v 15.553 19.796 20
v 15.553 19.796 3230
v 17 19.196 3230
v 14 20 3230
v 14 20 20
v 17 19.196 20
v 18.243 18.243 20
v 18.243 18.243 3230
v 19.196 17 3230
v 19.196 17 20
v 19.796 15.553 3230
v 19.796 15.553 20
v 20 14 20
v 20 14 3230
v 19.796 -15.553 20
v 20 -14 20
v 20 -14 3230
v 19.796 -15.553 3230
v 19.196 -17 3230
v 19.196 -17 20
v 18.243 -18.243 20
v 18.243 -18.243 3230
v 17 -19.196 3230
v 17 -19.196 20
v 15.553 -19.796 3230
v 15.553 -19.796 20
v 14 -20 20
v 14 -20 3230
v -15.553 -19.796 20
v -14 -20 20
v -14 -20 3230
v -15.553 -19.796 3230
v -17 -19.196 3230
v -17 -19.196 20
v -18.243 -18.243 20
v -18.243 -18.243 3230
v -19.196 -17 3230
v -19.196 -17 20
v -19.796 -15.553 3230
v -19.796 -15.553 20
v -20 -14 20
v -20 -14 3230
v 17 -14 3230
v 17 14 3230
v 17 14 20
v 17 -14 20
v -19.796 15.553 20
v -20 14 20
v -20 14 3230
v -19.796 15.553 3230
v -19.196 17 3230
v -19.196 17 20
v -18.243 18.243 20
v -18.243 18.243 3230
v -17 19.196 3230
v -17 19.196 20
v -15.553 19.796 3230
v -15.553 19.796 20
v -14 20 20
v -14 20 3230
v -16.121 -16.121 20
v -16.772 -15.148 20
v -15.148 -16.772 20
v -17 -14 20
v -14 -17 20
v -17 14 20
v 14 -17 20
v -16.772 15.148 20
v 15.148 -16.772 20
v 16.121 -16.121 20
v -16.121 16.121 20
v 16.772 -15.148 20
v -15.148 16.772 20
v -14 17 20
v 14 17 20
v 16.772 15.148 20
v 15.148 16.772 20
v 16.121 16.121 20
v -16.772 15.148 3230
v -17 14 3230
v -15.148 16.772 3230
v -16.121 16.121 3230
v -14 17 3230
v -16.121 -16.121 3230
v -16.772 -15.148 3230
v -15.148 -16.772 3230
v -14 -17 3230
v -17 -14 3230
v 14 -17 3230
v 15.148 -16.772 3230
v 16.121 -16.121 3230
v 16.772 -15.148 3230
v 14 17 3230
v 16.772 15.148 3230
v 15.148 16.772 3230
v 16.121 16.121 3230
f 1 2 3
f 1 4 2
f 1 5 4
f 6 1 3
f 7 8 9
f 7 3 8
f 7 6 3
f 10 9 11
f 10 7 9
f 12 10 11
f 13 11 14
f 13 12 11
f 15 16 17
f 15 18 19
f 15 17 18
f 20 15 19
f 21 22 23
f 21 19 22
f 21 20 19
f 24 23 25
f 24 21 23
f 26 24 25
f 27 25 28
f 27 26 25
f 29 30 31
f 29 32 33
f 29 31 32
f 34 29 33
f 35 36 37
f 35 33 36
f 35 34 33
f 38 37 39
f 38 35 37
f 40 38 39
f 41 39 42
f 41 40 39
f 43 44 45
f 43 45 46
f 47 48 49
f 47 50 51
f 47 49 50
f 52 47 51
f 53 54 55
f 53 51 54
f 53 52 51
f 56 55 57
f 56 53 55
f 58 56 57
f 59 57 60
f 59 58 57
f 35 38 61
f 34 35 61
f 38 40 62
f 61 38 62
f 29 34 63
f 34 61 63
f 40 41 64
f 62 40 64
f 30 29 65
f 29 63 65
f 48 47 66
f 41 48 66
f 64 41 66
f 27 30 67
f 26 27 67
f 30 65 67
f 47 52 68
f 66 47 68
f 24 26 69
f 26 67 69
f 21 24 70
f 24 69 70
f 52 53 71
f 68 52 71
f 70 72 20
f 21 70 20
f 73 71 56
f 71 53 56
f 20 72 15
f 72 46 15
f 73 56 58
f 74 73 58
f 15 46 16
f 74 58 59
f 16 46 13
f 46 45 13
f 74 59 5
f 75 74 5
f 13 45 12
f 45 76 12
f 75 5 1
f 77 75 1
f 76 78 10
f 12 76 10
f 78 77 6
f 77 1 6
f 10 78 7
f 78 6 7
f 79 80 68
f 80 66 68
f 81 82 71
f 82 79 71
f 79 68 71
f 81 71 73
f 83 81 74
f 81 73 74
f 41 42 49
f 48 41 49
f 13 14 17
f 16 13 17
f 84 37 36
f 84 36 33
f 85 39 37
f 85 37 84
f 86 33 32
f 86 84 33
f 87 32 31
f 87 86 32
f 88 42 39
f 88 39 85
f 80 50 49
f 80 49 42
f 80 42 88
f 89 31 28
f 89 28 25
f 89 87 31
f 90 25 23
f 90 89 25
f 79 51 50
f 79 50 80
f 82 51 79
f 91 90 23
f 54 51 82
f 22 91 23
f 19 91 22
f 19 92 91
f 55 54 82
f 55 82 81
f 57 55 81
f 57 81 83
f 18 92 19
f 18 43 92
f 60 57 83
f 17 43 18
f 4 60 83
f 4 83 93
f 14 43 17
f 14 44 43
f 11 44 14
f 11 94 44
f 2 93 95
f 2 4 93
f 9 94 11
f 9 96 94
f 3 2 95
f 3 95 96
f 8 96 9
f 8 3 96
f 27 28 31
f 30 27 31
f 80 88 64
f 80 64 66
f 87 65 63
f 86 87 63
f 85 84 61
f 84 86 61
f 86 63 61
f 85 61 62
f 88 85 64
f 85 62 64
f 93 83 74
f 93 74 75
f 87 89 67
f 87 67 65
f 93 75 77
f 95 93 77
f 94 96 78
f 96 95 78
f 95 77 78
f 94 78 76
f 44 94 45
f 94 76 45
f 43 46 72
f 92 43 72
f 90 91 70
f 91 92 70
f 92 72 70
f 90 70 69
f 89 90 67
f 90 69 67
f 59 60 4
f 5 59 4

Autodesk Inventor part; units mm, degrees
ref_plane "Start Plane" through (0, 0, 20) normal (0, 0, 1) x (1, 0, 0)
ref_plane "End Plane" through (0, 0, 3230) normal (0, 0, 1) x (1, 0, 0)
sketch "Sketch" plane through (0, 0, 0) normal (0, 0, 1) x (1, 0, 0)
  line L0 (-20, -14) -> (-20, 14)
  line L1 (-14, 20) -> (14, 20)
  line L2 (20, 14) -> (20, -14)
  line L3 (14, -20) -> (-14, -20)
  arc A0 (-20, -14) -> (-14, -20) centre (-14, -14) ccw
  arc A1 (20, 14) -> (14, 20) centre (14, 14) ccw
  arc A2 (-14, 20) -> (-20, 14) centre (-14, 14) ccw
  arc A3 (14, -20) -> (20, -14) centre (14, -14) ccw
  arc A4 (-14, 17) -> (-17, 14) centre (-14, 14) ccw
  line L4 (-14, 17) -> (14, 17)
  arc A5 (17, 14) -> (14, 17) centre (14, 14) ccw
  line L5 (17, 14) -> (17, -14)
  arc A6 (14, -17) -> (17, -14) centre (14, -14) ccw
  line L6 (14, -17) -> (-14, -17)
  arc A7 (-17, -14) -> (-14, -17) centre (-14, -14) ccw
  line L7 (-17, -14) -> (-17, 14)
  line L8 (0, 29.7397) -> (0, -29.7397) construction
  line L9 (-29.7397, 0) -> (29.7397, 0) construction
  dimension "d7" = 6
  dimension "d9" = 40
  dimension "d11" = 40
  dimension "d12" = 3
  dimension "d15" = 20
  dimension "d16" = 20
extrude "Body" add sketch "Sketch" along normal up to surface (3210 mm away) from surface at 20
sketch "Sketch3" plane through (0, 0, 0) normal (0, 0, 1) x (1, 0, 0)
  line L0 (0, 0) -> (10, 0)
ref_plane "Work Plane3" through (0, 0, 0) normal (0, -1, 0) x (1, 0, 0)
ref_plane "Work Plane4" through (856, -12, 3230) normal (0, 0, 1) x (1, 0, 0)
split "Split1" plane through (856, -12, 3230) removes the side toward (0, 0, 1)
ref_plane "Work Plane5" through (-1144, -12, 20) normal (0, 0, -1) x (-1, 0, 0)
split "Split2" plane through (-1144, -12, 20) removes the side toward (0, 0, -1)
sketch "Sketch4" plane through (0, 0, 0) normal (0, -1, 0) x (1, 0, 0)
  line L0 (-2, 20) -> (12, 20) projected
  line L1 (-2, 3230) -> (12, 3230) projected
  dimension "d18" = 3210
equation "\"d7\" = G_IR"
equation "\"d9\" = G_W"
equation "\"d11\" = G_H"
equation "\"d12\" = G_T"
equation "\"d15\" = 0.5 * d9"
equation "\"d16\" = 0.5 * d11"
equation "\"d3\" = G_L"
equation "\"G_W\" = 40"
equation "\"G_H\" = 40"
equation "\"G_T\" = 3"
equation "\"G_IR\" = 6"
equation "\"G_L\" = d18"
properties part number "ISO 10799-2 - 40x40x3 - 3210" material "Steel, Mild"
